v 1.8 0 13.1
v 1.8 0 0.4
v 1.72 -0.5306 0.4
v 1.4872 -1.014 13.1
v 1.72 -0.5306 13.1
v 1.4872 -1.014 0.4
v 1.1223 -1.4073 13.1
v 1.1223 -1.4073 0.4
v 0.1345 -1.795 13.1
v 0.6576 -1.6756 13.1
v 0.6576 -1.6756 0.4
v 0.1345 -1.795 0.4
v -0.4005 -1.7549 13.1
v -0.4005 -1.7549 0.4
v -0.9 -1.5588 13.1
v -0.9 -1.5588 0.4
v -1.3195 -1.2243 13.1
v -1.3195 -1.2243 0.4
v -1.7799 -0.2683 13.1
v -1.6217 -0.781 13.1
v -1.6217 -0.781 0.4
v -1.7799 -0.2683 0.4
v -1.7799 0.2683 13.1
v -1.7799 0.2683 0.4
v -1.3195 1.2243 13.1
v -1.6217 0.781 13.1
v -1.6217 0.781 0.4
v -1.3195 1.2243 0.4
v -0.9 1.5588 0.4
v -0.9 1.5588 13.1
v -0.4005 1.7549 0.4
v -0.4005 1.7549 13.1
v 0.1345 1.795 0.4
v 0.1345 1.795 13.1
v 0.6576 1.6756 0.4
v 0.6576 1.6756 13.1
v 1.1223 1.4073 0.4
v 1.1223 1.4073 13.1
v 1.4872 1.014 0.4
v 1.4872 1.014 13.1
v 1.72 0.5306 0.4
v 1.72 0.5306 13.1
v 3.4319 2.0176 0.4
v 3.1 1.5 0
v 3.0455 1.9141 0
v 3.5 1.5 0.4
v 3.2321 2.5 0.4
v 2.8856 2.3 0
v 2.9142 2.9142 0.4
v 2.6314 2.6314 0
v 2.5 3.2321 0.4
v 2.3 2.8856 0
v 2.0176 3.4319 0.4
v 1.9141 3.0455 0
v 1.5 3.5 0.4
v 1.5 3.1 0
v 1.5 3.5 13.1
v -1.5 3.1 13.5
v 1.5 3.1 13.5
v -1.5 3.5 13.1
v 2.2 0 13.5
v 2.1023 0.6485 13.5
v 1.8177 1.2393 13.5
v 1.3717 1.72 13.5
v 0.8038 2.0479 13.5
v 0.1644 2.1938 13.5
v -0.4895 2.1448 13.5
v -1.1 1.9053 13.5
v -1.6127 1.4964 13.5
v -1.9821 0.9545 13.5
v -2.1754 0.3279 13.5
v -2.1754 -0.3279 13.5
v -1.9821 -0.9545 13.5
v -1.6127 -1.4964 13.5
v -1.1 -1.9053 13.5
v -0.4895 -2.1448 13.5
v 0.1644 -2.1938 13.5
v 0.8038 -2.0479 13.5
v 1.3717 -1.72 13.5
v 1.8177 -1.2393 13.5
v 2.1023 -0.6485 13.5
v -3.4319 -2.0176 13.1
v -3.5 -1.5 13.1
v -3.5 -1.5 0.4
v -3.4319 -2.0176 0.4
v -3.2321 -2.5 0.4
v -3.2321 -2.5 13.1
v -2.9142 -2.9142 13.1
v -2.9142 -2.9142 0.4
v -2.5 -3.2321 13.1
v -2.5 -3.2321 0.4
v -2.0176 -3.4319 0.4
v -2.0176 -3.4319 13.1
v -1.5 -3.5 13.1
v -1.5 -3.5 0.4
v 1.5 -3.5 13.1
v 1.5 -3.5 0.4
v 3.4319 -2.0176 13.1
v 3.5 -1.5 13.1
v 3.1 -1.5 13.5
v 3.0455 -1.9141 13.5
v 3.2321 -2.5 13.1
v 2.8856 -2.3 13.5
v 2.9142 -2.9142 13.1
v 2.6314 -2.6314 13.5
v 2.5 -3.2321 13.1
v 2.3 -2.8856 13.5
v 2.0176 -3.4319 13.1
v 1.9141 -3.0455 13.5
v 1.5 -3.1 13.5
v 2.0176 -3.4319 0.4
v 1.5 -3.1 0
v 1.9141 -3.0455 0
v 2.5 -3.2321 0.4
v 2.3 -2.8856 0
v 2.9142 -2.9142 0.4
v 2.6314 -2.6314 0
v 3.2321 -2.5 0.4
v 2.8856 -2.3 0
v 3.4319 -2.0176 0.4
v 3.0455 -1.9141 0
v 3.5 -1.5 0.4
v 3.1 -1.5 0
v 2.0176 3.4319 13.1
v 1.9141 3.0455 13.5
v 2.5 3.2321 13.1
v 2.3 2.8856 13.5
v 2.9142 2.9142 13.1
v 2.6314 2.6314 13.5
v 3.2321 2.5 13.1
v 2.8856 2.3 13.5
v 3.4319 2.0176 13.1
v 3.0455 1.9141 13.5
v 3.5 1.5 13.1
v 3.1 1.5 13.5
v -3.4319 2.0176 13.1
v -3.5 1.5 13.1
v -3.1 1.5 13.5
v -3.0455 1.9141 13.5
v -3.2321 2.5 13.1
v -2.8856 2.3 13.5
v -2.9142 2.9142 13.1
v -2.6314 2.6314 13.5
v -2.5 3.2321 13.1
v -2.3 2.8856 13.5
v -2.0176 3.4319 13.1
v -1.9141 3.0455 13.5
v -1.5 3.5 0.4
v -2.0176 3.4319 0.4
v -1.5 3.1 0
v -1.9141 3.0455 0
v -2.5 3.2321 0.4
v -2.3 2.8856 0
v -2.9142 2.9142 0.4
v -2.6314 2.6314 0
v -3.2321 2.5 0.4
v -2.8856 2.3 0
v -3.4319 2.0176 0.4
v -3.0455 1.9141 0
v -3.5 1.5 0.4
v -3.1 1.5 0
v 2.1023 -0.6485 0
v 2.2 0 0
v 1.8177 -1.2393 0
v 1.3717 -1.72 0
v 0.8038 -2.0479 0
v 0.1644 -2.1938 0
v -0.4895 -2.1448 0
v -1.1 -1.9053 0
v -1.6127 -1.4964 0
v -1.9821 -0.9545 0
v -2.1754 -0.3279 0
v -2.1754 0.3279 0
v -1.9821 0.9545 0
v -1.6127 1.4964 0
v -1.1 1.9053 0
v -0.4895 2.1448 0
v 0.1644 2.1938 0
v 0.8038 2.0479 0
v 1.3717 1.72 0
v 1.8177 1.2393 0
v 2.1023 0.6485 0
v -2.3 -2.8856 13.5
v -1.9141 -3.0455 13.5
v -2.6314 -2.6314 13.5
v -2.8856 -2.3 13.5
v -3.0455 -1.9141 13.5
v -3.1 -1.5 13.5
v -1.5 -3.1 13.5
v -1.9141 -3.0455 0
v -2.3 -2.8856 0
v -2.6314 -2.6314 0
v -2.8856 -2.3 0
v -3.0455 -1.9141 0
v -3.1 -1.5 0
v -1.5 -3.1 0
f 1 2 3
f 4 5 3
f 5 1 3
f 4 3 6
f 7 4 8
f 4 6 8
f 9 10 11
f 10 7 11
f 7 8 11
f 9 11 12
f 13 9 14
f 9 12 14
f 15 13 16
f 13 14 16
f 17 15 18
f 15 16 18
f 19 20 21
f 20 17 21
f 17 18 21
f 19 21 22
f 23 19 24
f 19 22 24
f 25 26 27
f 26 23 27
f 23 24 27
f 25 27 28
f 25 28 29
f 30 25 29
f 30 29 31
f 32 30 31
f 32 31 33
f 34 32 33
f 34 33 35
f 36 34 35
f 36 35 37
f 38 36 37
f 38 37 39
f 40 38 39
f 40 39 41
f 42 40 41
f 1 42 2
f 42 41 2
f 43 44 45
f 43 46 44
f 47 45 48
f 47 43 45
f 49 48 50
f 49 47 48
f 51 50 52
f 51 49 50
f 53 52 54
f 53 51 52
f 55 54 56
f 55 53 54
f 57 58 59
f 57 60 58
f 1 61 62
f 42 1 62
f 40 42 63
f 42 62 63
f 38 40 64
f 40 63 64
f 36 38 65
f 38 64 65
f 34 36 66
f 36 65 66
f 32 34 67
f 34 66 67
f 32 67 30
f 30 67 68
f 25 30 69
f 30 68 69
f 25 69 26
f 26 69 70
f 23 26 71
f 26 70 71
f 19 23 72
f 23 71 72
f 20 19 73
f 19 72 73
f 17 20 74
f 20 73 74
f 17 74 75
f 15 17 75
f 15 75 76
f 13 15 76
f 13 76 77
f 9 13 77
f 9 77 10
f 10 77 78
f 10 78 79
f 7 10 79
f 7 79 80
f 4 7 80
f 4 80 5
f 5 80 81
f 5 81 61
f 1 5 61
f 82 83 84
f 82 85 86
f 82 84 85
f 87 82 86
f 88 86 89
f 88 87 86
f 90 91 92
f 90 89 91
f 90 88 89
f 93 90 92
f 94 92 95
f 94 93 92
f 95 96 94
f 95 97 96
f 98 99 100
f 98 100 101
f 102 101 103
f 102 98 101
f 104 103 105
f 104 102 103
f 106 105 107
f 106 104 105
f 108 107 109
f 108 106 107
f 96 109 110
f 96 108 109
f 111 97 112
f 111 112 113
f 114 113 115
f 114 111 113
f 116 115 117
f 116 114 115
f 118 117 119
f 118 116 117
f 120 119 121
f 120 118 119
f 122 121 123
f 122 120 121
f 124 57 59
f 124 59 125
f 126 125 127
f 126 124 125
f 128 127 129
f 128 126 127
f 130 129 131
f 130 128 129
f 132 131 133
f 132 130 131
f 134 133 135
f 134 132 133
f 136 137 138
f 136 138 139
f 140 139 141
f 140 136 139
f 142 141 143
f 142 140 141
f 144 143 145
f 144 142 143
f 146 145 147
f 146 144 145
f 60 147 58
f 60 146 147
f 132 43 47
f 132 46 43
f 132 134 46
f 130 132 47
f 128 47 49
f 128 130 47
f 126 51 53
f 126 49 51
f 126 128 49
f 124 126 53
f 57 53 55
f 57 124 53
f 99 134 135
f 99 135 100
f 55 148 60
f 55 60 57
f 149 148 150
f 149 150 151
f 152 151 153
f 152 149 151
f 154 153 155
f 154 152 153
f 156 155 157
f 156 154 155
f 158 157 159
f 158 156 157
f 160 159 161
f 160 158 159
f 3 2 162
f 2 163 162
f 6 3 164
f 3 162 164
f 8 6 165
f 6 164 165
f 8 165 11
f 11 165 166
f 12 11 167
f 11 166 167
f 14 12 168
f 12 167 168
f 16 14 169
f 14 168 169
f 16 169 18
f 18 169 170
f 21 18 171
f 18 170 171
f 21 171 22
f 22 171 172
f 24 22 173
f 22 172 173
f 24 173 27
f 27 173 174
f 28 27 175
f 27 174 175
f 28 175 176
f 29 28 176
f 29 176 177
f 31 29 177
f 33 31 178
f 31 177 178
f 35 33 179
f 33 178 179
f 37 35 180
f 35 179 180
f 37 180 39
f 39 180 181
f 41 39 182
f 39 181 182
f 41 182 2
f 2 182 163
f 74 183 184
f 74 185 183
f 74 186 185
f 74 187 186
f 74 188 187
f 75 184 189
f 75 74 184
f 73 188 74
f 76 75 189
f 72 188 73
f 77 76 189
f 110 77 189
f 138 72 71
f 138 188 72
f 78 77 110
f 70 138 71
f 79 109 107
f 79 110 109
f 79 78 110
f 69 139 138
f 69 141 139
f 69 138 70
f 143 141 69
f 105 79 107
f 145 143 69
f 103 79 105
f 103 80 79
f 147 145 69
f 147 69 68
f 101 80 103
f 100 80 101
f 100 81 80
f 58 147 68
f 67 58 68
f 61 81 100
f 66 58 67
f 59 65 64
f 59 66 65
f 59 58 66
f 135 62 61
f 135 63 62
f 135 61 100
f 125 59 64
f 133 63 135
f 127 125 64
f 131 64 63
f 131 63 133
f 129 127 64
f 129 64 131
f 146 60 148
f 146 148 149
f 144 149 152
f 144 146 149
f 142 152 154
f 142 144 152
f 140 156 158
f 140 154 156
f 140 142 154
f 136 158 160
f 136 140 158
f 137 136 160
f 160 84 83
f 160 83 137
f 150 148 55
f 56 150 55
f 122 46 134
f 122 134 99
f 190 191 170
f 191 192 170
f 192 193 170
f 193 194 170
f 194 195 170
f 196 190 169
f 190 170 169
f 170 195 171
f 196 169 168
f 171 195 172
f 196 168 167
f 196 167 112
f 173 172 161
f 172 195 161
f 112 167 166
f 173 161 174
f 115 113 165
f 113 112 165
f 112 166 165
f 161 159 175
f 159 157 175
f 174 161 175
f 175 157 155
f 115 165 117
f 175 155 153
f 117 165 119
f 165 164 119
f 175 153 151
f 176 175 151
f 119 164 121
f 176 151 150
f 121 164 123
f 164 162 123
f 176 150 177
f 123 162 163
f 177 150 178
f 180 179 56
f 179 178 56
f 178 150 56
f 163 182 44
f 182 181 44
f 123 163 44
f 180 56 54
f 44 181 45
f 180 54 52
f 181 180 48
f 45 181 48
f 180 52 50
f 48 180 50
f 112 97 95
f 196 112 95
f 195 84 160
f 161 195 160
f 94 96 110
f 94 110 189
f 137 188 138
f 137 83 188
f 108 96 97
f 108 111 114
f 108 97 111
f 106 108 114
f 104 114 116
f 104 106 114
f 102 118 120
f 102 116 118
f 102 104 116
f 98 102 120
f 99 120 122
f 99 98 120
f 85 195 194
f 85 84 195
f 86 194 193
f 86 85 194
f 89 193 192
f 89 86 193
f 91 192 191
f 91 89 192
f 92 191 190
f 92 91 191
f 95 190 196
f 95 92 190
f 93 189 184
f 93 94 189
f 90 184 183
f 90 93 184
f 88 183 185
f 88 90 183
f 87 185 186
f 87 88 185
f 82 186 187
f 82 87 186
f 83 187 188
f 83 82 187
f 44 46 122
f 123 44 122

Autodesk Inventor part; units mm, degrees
ref_plane "YZ Plane" through (0, 0, 0) normal (1, 0, 0) x (0, 1, 0)
ref_plane "XZ Plane" through (0, 0, 0) normal (0, 1, 0) x (-1, 0, 0)
ref_plane "XY Plane" through (0, 0, 0) normal (0, 0, 1) x (1, 0, 0)
sketch "Sketch1" plane through (0, 0, 0) normal (0, 0, 1) x (1, 0, 0)
  circle A0 centre (0, 0) radius 1.8
  line L0 (-3.5, 3.5) -> (3.5, 3.5)
  line L1 (3.5, 3.5) -> (3.5, -3.5)
  line L2 (3.5, -3.5) -> (-3.5, -3.5)
  line L3 (-3.5, -3.5) -> (-3.5, 3.5)
  point P0 (3.5, 0)
  point P1 (0, 3.5)
  dimension "d0" = 3.6
  dimension "d24" = 7
extrude "Extrusion1" add sketch "Sketch1" along normal blind 13.5
fillet "Fillet3" radius 2 4 edges at (3.5, 3.5, 6.75) (3.5, -3.5, 6.75) (-3.5, -3.5, 6.75) (-3.5, 3.5, 6.75)
chamfer "Chamfer4" distance 0.4 angle 45 18 edges at (-2.9142, -2.9142, 13.5) (-3.5, 0, 13.5) (-2.9142, 2.9142, 13.5) (0, 3.5, 13.5) (2.9142, 2.9142, 13.5) (3.5, 0, 13.5) (2.9142, -2.9142, 13.5) (0, -3.5, 13.5) (2.9142, -2.9142, 0) (3.5, 0, 0) (2.9142, 2.9142, 0) (0, 3.5, 0) (-2.9142, 2.9142, 0) (-3.5, 0, 0) (-2.9142, -2.9142, 0) (0, -3.5, 0) (-1.8, 0, 13.5) (-1.8, 0, 0)
properties part number "shaft-15mm-squareipt" material "ABS Plastic"
